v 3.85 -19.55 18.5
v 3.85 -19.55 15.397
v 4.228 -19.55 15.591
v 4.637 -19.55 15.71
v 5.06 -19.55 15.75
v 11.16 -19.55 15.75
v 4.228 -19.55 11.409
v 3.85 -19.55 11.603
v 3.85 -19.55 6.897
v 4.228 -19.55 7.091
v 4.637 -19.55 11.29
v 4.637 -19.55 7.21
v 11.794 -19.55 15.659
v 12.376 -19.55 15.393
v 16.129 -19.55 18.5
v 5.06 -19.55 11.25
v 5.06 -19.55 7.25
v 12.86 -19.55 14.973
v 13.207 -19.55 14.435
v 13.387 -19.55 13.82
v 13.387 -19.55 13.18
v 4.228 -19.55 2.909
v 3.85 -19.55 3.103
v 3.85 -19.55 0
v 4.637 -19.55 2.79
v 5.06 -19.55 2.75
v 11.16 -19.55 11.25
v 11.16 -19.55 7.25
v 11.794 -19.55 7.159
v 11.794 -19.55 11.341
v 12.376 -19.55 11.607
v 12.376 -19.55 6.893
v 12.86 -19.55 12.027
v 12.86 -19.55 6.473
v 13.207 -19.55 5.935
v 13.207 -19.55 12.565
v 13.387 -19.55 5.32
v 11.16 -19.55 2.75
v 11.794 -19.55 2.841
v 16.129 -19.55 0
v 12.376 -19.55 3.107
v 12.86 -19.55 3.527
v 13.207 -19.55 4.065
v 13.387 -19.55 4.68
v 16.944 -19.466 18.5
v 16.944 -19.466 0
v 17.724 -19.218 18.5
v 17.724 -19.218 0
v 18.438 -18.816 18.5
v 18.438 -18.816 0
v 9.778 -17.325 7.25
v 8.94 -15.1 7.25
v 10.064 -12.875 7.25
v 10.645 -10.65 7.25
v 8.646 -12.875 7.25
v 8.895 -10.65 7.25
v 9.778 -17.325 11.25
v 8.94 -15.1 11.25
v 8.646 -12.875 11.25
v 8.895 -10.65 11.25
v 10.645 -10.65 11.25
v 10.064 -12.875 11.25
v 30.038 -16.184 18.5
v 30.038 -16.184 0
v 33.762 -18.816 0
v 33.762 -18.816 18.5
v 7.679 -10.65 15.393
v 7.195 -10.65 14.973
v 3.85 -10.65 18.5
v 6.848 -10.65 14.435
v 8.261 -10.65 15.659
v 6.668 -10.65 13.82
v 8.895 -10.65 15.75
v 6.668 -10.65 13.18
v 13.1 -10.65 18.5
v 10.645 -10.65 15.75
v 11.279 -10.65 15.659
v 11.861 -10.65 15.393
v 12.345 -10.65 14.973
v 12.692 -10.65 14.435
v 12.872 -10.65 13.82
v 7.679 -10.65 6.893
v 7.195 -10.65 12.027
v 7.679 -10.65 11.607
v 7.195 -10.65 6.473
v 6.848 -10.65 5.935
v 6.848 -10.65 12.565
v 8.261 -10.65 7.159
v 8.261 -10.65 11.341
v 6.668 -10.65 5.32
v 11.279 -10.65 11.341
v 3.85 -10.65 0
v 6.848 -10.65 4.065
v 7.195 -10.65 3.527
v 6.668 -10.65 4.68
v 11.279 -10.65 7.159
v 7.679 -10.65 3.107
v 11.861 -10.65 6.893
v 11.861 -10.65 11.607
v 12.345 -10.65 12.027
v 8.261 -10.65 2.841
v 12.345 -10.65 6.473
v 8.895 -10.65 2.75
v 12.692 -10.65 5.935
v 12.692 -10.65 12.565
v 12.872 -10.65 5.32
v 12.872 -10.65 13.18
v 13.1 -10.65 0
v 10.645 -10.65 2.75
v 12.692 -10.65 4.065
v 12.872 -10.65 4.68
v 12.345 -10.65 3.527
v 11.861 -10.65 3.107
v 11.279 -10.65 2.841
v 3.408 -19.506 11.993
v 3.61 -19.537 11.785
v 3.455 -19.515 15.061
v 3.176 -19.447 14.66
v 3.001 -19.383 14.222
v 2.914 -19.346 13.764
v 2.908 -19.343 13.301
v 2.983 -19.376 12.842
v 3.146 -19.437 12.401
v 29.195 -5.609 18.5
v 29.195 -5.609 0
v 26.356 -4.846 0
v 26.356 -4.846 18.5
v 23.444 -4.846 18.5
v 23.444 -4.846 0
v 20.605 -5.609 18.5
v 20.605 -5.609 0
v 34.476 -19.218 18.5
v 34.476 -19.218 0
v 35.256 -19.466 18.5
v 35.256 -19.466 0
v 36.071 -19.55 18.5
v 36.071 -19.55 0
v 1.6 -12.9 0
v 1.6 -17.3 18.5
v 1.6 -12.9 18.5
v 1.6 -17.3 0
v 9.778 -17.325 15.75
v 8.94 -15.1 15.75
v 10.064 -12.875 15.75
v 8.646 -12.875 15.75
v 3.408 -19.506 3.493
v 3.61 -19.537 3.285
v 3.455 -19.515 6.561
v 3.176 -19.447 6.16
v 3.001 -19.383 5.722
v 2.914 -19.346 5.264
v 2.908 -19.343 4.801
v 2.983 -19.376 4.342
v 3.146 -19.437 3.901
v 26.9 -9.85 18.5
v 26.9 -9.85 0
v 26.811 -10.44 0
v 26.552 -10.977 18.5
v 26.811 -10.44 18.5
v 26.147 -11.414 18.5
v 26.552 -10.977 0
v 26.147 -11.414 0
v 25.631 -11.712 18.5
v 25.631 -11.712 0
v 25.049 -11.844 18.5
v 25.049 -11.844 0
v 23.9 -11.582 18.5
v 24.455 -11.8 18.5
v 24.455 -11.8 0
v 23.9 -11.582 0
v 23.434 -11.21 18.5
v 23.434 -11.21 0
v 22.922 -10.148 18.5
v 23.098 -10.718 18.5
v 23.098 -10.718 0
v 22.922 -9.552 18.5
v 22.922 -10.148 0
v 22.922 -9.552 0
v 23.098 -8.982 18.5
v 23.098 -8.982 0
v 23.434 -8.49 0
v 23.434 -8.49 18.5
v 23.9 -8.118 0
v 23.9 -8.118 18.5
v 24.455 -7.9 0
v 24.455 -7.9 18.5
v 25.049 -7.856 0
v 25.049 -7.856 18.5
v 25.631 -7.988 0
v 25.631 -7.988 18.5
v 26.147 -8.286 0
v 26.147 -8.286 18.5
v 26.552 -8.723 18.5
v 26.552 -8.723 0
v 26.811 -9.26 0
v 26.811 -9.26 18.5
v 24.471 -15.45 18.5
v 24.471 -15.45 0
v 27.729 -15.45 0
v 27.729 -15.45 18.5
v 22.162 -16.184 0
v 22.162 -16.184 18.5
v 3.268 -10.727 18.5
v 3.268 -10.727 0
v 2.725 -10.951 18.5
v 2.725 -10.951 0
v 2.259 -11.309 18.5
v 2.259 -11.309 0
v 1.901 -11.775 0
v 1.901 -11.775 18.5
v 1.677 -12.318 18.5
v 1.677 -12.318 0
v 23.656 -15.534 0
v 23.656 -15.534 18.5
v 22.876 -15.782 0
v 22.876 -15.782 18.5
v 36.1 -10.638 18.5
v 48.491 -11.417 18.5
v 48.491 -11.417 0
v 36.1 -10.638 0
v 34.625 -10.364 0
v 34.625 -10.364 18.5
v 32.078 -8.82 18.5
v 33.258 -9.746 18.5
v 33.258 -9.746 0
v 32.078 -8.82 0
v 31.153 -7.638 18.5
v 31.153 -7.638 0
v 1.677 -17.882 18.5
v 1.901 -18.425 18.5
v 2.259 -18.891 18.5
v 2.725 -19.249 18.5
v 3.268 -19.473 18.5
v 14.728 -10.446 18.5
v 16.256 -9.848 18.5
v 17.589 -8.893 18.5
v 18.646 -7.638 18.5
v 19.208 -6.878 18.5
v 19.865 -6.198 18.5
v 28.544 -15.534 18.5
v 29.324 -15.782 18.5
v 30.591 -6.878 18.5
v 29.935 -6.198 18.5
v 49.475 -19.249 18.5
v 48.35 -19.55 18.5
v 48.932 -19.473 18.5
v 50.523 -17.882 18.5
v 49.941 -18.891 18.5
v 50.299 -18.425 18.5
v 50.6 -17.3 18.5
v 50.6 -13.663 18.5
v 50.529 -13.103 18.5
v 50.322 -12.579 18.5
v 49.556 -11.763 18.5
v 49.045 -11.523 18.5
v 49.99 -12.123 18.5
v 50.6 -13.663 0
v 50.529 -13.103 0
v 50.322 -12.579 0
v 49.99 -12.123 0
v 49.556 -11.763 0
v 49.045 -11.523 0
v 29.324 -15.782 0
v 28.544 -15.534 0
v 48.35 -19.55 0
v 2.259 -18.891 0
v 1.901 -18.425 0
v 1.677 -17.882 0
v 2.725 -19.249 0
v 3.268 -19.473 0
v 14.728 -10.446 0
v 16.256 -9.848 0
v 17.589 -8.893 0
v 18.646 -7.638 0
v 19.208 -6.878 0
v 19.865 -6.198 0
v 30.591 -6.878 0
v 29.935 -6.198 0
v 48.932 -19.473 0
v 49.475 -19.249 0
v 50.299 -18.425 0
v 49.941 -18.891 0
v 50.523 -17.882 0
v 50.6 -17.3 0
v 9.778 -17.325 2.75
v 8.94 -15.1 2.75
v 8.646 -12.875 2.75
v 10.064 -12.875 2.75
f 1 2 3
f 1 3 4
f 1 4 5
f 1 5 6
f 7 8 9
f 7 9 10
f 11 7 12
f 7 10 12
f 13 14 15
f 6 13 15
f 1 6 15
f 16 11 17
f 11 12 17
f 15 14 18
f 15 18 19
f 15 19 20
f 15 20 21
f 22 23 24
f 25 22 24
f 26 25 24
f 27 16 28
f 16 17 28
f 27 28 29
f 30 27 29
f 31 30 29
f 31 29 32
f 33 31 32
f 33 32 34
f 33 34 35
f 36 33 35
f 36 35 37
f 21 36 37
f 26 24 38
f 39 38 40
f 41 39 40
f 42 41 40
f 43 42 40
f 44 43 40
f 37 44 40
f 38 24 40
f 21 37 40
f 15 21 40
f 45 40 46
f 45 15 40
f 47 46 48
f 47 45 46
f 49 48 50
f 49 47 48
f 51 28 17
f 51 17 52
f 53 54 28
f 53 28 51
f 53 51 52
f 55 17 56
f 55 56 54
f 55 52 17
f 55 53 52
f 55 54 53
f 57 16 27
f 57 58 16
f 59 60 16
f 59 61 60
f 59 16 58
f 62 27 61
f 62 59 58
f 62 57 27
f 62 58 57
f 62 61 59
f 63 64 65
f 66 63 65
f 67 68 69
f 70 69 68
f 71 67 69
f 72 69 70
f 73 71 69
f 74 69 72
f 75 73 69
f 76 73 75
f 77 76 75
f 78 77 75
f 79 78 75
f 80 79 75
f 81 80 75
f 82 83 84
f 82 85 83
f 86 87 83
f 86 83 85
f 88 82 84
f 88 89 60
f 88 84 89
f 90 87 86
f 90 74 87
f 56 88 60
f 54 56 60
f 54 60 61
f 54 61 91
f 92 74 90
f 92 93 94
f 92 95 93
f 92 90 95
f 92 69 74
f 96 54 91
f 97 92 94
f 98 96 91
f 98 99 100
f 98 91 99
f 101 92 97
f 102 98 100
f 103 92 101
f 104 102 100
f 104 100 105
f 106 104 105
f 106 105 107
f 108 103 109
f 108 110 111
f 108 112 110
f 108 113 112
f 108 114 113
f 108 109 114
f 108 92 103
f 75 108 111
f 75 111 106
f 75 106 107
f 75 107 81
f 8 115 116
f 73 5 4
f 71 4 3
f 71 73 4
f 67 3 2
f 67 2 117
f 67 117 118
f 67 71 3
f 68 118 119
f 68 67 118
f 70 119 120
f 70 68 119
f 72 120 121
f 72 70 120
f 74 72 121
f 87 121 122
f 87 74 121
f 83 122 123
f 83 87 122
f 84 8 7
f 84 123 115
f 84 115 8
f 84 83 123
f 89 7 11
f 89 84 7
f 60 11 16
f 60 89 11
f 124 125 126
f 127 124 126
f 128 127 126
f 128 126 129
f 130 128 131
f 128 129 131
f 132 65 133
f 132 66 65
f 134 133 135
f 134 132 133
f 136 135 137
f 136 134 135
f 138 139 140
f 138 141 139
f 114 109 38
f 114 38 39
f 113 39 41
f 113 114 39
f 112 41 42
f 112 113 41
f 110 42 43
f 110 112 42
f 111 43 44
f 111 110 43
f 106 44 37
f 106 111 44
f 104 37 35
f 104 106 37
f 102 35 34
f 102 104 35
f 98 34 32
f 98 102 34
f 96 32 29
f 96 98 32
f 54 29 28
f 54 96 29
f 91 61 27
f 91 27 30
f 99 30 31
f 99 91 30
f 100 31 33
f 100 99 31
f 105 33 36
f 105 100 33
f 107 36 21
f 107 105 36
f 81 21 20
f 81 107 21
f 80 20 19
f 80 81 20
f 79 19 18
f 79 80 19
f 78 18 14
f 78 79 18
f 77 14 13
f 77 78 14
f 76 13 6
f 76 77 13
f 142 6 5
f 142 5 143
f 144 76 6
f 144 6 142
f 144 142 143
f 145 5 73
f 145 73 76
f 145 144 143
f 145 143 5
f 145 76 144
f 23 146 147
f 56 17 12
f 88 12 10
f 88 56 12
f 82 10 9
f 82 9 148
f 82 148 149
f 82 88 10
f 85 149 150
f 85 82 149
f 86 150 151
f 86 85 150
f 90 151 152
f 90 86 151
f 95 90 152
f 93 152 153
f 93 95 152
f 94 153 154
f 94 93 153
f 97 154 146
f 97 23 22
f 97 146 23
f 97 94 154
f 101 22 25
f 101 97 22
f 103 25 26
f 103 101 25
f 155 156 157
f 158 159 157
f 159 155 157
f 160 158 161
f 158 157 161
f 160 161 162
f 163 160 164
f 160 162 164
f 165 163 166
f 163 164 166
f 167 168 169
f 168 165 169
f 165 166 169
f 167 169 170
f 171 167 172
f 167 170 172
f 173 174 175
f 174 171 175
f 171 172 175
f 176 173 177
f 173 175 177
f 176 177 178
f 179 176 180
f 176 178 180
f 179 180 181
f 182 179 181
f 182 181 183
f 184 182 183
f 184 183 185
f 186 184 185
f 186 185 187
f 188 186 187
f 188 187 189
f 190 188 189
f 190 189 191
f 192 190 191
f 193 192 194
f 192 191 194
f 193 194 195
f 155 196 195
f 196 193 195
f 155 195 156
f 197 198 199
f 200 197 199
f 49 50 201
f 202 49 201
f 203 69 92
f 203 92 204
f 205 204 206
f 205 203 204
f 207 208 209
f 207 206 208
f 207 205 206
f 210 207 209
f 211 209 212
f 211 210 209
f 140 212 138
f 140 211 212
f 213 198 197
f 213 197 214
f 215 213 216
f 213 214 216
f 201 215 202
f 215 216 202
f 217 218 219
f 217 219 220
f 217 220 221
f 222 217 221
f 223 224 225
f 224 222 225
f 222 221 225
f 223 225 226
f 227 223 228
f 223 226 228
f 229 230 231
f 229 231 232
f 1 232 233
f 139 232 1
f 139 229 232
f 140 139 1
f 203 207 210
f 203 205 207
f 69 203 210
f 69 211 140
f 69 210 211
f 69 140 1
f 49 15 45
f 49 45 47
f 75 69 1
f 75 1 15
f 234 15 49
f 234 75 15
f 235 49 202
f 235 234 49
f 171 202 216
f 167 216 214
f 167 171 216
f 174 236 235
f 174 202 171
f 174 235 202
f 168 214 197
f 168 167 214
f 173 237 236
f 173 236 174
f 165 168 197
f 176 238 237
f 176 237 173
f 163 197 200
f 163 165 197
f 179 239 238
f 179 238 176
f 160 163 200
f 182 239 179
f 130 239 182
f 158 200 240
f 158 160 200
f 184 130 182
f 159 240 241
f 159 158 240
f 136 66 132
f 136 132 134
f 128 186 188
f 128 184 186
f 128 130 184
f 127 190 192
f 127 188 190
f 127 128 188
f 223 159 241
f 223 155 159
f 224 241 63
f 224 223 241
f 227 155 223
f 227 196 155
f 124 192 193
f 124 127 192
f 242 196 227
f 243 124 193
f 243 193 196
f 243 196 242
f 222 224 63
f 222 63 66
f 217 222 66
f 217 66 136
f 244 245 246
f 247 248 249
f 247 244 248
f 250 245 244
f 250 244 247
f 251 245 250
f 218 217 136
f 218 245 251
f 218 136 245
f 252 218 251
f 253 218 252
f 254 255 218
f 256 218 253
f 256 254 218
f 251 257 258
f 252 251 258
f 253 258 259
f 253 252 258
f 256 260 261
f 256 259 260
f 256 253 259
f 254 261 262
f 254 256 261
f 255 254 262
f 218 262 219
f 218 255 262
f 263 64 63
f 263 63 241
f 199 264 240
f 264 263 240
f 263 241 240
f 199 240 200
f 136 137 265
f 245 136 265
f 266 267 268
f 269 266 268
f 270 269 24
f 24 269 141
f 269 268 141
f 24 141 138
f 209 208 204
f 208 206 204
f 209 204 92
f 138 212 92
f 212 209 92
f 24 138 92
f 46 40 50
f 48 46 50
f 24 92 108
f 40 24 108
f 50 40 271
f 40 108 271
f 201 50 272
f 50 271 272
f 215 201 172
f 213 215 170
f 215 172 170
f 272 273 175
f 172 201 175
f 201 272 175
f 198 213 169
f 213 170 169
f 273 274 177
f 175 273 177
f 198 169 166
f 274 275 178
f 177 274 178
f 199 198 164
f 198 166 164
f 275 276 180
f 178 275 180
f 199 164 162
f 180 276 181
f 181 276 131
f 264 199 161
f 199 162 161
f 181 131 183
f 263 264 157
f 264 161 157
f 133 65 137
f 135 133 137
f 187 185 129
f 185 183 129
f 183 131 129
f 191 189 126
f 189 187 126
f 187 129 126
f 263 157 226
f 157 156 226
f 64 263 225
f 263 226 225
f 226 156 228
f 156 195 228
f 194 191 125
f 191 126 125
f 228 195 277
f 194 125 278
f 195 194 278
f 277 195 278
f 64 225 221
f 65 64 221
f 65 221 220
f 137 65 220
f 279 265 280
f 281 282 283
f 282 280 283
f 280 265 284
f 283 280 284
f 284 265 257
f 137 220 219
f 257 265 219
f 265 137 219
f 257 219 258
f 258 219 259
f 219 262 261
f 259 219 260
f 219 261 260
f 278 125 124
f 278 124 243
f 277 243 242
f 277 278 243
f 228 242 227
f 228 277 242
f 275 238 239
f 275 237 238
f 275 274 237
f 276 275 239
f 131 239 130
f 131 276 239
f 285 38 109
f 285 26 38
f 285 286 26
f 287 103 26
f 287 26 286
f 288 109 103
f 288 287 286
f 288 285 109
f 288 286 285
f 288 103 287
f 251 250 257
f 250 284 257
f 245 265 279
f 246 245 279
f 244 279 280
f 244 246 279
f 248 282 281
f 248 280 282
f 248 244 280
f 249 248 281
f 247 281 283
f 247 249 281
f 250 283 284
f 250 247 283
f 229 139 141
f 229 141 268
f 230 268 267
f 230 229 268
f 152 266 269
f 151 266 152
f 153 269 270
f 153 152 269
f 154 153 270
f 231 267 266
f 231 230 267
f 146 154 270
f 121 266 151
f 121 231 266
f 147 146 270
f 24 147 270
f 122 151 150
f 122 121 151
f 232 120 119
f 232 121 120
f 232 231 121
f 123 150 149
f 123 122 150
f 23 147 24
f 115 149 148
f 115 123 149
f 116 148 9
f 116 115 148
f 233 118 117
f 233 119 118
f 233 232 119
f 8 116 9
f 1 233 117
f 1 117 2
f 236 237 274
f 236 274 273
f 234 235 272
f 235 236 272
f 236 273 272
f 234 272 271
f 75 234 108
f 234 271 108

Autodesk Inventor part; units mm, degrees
ref_plane "YZ Plane" through (0, 0, 0) normal (1, 0, 0) x (0, 1, 0)
ref_plane "XZ Plane" through (0, 0, 0) normal (0, 1, 0) x (-1, 0, 0)
ref_plane "XY Plane" through (0, 0, 0) normal (0, 0, 1) x (1, 0, 0)
sketch "Sketch1" plane through (0, 0, 0) normal (0, 0, 1) x (1, 0, 0)
  line L0 (0, 0) -> (51.4289, 0) construction
  line L1 (51.4289, 0) -> (51.4289, -25.9828) construction
  line L2 (51.4289, -25.9828) -> (0, -25.9828) construction
  line L3 (0, -25.9828) -> (0, 0) construction
  circle A0 centre (24.9, -9.85) radius 2
  line L4 (1.6, -19.55) -> (1.6, -10.65)
  line L5 (1.6, -10.65) -> (13.1, -10.65)
  line L6 (1.6, -19.55) -> (17.4, -19.55)
  line L7 (17.4, -19.55) -> (23.2, -15.45)
  line L8 (23.2, -15.45) -> (29, -15.45)
  line L9 (29, -15.45) -> (34.8, -19.55)
  line L10 (34.8, -19.55) -> (50.6, -19.55)
  line L11 (50.6, -19.55) -> (50.6, -11.55)
  line L12 (50.6, -11.55) -> (36.1, -10.6377)
  arc A1 (31.1534, -7.6382) -> (29.195, -5.6092) centre (25.0705, -11.55) ccw
  arc A2 (20.6046, -5.6092) -> (18.6461, -7.6382) centre (24.7291, -11.55) ccw
  arc A3 (31.1534, -7.6382) -> (36.1, -10.6377) centre (36.4916, -4.4135) ccw
  arc A4 (13.1, -10.65) -> (18.6461, -7.6382) centre (13.1, -4.0375) ccw
  ellipse E0 centre (24.9, -20.05) end of major axis (24.9008, -35.35) minor radius 13 (29.195, -5.6092) -> (20.6046, -5.6092) ccw
  dimension "d45" = 13
  dimension "d46" = 15.3
  dimension "d22" = 4
  dimension "d35" = 0.5
  dimension "d36" = 1.6
  dimension "d37" = 10.65
  dimension "d38" = 8.9
  dimension "d39" = 3.6
  dimension "d47" = 8
  dimension "d51" = 17.4
  dimension "d52" = 25.7
  dimension "d53" = 9.7
  dimension "d54" = 11.5
  dimension "d55" = 14.5
  dimension "d57" = 0.3414
  dimension "d59" = 5.8
  dimension "d61" = 4.1
  dimension "d63" = 15.8
  dimension "d64" = 15.8
  dimension "d66" = 8
  dimension "d72" = 0.1705
  dimension "d76" = 7.2322
  dimension "d77" = 6.2366
extrude "Extrusion1" add sketch "Sketch1" along normal blind 18.5
fillet "Fillet1" radius 2.25 4 edges at (1.6, -10.65, 9.25) (1.6, -19.55, 9.25) (50.6, -11.55, 9.25) (50.6, -19.55, 9.25)
fillet "Fillet2" radius 4 4 edges at (23.2, -15.45, 9.25) (29, -15.45, 9.25) (34.8, -19.55, 9.25) (17.4, -19.55, 9.25)
sketch "Sketch3" plane through (3.85, -19.55, 0) normal (0, -1, 0) x (1, 0, 0)
  line L0 (0, 18.5) -> (12.279, 18.5) projected
  line L1 (12.279, 0) -> (0, 0) projected
  line L2 (1.21, 13.5) -> (7.31, 13.5) construction
  line L3 (1.21, 11.25) -> (7.31, 11.25)
  line L4 (7.31, 15.75) -> (1.21, 15.75)
  arc A0 (1.21, 15.75) -> (1.21, 11.25) centre (1.21, 13.5) ccw
  arc A1 (7.31, 11.25) -> (7.31, 15.75) centre (7.31, 13.5) ccw
  line L5 (1.21, 5) -> (7.31, 5) construction
  line L6 (1.21, 7.25) -> (7.31, 7.25)
  line L7 (7.31, 2.75) -> (1.21, 2.75)
  arc A2 (1.21, 7.25) -> (1.21, 2.75) centre (1.21, 5) ccw
  arc A3 (7.31, 2.75) -> (7.31, 7.25) centre (7.31, 5) ccw
  line L8 (-2.25, 18.5) -> (-2.25, 0) projected
  point P0 (-3.85, 0)
  point P1 (4.26, 13.5)
  point P2 (4.26, 5)
  dimension "d88" = 4.5
  dimension "d89" = 6.1
  dimension "d90" = 5
  dimension "d91" = 5
  dimension "d92" = 9.56
sketch "Sketch2" plane through (13.1, -10.65, 18.5) normal (0, 1, 0) x (1, 0, 0)
  line L0 (0, 0) -> (-9.25, 0) projected
  line L1 (-9.25, 18.5) -> (0, 18.5) projected
  line L2 (-4.205, 13.5) -> (-2.455, 13.5) construction
  line L3 (-4.205, 11.25) -> (-2.455, 11.25)
  line L4 (-2.455, 15.75) -> (-4.205, 15.75)
  arc A0 (-4.205, 15.75) -> (-4.205, 11.25) centre (-4.205, 13.5) ccw
  arc A1 (-2.455, 11.25) -> (-2.455, 15.75) centre (-2.455, 13.5) ccw
  line L5 (-4.205, 5) -> (-2.455, 5) construction
  line L6 (-4.205, 2.75) -> (-2.455, 2.75)
  line L7 (-2.455, 7.25) -> (-4.205, 7.25)
  arc A2 (-4.205, 7.25) -> (-4.205, 2.75) centre (-4.205, 5) ccw
  arc A3 (-2.455, 2.75) -> (-2.455, 7.25) centre (-2.455, 5) ccw
  line L8 (-11.5, 18.5) -> (-11.5, 0) projected
  point P0 (-13.1, 18.5)
  point P1 (-3.33, 13.5)
  point P2 (-3.33, 5)
  dimension "d83" = 4.5
  dimension "d84" = 1.75
  dimension "d85" = 5
  dimension "d86" = 5
  dimension "d87" = 8.17
loft "Loft1" cut profiles "Sketch3", "Sketch2" contours A0 L4 A1 L3 / A2 L7 A3 L6
loft "Loft2" cut profiles "Sketch3", "Sketch2" contours L6 A3 L7 A2 / A0 L4 A1 L3
properties part number "FelixOriginalLever"
